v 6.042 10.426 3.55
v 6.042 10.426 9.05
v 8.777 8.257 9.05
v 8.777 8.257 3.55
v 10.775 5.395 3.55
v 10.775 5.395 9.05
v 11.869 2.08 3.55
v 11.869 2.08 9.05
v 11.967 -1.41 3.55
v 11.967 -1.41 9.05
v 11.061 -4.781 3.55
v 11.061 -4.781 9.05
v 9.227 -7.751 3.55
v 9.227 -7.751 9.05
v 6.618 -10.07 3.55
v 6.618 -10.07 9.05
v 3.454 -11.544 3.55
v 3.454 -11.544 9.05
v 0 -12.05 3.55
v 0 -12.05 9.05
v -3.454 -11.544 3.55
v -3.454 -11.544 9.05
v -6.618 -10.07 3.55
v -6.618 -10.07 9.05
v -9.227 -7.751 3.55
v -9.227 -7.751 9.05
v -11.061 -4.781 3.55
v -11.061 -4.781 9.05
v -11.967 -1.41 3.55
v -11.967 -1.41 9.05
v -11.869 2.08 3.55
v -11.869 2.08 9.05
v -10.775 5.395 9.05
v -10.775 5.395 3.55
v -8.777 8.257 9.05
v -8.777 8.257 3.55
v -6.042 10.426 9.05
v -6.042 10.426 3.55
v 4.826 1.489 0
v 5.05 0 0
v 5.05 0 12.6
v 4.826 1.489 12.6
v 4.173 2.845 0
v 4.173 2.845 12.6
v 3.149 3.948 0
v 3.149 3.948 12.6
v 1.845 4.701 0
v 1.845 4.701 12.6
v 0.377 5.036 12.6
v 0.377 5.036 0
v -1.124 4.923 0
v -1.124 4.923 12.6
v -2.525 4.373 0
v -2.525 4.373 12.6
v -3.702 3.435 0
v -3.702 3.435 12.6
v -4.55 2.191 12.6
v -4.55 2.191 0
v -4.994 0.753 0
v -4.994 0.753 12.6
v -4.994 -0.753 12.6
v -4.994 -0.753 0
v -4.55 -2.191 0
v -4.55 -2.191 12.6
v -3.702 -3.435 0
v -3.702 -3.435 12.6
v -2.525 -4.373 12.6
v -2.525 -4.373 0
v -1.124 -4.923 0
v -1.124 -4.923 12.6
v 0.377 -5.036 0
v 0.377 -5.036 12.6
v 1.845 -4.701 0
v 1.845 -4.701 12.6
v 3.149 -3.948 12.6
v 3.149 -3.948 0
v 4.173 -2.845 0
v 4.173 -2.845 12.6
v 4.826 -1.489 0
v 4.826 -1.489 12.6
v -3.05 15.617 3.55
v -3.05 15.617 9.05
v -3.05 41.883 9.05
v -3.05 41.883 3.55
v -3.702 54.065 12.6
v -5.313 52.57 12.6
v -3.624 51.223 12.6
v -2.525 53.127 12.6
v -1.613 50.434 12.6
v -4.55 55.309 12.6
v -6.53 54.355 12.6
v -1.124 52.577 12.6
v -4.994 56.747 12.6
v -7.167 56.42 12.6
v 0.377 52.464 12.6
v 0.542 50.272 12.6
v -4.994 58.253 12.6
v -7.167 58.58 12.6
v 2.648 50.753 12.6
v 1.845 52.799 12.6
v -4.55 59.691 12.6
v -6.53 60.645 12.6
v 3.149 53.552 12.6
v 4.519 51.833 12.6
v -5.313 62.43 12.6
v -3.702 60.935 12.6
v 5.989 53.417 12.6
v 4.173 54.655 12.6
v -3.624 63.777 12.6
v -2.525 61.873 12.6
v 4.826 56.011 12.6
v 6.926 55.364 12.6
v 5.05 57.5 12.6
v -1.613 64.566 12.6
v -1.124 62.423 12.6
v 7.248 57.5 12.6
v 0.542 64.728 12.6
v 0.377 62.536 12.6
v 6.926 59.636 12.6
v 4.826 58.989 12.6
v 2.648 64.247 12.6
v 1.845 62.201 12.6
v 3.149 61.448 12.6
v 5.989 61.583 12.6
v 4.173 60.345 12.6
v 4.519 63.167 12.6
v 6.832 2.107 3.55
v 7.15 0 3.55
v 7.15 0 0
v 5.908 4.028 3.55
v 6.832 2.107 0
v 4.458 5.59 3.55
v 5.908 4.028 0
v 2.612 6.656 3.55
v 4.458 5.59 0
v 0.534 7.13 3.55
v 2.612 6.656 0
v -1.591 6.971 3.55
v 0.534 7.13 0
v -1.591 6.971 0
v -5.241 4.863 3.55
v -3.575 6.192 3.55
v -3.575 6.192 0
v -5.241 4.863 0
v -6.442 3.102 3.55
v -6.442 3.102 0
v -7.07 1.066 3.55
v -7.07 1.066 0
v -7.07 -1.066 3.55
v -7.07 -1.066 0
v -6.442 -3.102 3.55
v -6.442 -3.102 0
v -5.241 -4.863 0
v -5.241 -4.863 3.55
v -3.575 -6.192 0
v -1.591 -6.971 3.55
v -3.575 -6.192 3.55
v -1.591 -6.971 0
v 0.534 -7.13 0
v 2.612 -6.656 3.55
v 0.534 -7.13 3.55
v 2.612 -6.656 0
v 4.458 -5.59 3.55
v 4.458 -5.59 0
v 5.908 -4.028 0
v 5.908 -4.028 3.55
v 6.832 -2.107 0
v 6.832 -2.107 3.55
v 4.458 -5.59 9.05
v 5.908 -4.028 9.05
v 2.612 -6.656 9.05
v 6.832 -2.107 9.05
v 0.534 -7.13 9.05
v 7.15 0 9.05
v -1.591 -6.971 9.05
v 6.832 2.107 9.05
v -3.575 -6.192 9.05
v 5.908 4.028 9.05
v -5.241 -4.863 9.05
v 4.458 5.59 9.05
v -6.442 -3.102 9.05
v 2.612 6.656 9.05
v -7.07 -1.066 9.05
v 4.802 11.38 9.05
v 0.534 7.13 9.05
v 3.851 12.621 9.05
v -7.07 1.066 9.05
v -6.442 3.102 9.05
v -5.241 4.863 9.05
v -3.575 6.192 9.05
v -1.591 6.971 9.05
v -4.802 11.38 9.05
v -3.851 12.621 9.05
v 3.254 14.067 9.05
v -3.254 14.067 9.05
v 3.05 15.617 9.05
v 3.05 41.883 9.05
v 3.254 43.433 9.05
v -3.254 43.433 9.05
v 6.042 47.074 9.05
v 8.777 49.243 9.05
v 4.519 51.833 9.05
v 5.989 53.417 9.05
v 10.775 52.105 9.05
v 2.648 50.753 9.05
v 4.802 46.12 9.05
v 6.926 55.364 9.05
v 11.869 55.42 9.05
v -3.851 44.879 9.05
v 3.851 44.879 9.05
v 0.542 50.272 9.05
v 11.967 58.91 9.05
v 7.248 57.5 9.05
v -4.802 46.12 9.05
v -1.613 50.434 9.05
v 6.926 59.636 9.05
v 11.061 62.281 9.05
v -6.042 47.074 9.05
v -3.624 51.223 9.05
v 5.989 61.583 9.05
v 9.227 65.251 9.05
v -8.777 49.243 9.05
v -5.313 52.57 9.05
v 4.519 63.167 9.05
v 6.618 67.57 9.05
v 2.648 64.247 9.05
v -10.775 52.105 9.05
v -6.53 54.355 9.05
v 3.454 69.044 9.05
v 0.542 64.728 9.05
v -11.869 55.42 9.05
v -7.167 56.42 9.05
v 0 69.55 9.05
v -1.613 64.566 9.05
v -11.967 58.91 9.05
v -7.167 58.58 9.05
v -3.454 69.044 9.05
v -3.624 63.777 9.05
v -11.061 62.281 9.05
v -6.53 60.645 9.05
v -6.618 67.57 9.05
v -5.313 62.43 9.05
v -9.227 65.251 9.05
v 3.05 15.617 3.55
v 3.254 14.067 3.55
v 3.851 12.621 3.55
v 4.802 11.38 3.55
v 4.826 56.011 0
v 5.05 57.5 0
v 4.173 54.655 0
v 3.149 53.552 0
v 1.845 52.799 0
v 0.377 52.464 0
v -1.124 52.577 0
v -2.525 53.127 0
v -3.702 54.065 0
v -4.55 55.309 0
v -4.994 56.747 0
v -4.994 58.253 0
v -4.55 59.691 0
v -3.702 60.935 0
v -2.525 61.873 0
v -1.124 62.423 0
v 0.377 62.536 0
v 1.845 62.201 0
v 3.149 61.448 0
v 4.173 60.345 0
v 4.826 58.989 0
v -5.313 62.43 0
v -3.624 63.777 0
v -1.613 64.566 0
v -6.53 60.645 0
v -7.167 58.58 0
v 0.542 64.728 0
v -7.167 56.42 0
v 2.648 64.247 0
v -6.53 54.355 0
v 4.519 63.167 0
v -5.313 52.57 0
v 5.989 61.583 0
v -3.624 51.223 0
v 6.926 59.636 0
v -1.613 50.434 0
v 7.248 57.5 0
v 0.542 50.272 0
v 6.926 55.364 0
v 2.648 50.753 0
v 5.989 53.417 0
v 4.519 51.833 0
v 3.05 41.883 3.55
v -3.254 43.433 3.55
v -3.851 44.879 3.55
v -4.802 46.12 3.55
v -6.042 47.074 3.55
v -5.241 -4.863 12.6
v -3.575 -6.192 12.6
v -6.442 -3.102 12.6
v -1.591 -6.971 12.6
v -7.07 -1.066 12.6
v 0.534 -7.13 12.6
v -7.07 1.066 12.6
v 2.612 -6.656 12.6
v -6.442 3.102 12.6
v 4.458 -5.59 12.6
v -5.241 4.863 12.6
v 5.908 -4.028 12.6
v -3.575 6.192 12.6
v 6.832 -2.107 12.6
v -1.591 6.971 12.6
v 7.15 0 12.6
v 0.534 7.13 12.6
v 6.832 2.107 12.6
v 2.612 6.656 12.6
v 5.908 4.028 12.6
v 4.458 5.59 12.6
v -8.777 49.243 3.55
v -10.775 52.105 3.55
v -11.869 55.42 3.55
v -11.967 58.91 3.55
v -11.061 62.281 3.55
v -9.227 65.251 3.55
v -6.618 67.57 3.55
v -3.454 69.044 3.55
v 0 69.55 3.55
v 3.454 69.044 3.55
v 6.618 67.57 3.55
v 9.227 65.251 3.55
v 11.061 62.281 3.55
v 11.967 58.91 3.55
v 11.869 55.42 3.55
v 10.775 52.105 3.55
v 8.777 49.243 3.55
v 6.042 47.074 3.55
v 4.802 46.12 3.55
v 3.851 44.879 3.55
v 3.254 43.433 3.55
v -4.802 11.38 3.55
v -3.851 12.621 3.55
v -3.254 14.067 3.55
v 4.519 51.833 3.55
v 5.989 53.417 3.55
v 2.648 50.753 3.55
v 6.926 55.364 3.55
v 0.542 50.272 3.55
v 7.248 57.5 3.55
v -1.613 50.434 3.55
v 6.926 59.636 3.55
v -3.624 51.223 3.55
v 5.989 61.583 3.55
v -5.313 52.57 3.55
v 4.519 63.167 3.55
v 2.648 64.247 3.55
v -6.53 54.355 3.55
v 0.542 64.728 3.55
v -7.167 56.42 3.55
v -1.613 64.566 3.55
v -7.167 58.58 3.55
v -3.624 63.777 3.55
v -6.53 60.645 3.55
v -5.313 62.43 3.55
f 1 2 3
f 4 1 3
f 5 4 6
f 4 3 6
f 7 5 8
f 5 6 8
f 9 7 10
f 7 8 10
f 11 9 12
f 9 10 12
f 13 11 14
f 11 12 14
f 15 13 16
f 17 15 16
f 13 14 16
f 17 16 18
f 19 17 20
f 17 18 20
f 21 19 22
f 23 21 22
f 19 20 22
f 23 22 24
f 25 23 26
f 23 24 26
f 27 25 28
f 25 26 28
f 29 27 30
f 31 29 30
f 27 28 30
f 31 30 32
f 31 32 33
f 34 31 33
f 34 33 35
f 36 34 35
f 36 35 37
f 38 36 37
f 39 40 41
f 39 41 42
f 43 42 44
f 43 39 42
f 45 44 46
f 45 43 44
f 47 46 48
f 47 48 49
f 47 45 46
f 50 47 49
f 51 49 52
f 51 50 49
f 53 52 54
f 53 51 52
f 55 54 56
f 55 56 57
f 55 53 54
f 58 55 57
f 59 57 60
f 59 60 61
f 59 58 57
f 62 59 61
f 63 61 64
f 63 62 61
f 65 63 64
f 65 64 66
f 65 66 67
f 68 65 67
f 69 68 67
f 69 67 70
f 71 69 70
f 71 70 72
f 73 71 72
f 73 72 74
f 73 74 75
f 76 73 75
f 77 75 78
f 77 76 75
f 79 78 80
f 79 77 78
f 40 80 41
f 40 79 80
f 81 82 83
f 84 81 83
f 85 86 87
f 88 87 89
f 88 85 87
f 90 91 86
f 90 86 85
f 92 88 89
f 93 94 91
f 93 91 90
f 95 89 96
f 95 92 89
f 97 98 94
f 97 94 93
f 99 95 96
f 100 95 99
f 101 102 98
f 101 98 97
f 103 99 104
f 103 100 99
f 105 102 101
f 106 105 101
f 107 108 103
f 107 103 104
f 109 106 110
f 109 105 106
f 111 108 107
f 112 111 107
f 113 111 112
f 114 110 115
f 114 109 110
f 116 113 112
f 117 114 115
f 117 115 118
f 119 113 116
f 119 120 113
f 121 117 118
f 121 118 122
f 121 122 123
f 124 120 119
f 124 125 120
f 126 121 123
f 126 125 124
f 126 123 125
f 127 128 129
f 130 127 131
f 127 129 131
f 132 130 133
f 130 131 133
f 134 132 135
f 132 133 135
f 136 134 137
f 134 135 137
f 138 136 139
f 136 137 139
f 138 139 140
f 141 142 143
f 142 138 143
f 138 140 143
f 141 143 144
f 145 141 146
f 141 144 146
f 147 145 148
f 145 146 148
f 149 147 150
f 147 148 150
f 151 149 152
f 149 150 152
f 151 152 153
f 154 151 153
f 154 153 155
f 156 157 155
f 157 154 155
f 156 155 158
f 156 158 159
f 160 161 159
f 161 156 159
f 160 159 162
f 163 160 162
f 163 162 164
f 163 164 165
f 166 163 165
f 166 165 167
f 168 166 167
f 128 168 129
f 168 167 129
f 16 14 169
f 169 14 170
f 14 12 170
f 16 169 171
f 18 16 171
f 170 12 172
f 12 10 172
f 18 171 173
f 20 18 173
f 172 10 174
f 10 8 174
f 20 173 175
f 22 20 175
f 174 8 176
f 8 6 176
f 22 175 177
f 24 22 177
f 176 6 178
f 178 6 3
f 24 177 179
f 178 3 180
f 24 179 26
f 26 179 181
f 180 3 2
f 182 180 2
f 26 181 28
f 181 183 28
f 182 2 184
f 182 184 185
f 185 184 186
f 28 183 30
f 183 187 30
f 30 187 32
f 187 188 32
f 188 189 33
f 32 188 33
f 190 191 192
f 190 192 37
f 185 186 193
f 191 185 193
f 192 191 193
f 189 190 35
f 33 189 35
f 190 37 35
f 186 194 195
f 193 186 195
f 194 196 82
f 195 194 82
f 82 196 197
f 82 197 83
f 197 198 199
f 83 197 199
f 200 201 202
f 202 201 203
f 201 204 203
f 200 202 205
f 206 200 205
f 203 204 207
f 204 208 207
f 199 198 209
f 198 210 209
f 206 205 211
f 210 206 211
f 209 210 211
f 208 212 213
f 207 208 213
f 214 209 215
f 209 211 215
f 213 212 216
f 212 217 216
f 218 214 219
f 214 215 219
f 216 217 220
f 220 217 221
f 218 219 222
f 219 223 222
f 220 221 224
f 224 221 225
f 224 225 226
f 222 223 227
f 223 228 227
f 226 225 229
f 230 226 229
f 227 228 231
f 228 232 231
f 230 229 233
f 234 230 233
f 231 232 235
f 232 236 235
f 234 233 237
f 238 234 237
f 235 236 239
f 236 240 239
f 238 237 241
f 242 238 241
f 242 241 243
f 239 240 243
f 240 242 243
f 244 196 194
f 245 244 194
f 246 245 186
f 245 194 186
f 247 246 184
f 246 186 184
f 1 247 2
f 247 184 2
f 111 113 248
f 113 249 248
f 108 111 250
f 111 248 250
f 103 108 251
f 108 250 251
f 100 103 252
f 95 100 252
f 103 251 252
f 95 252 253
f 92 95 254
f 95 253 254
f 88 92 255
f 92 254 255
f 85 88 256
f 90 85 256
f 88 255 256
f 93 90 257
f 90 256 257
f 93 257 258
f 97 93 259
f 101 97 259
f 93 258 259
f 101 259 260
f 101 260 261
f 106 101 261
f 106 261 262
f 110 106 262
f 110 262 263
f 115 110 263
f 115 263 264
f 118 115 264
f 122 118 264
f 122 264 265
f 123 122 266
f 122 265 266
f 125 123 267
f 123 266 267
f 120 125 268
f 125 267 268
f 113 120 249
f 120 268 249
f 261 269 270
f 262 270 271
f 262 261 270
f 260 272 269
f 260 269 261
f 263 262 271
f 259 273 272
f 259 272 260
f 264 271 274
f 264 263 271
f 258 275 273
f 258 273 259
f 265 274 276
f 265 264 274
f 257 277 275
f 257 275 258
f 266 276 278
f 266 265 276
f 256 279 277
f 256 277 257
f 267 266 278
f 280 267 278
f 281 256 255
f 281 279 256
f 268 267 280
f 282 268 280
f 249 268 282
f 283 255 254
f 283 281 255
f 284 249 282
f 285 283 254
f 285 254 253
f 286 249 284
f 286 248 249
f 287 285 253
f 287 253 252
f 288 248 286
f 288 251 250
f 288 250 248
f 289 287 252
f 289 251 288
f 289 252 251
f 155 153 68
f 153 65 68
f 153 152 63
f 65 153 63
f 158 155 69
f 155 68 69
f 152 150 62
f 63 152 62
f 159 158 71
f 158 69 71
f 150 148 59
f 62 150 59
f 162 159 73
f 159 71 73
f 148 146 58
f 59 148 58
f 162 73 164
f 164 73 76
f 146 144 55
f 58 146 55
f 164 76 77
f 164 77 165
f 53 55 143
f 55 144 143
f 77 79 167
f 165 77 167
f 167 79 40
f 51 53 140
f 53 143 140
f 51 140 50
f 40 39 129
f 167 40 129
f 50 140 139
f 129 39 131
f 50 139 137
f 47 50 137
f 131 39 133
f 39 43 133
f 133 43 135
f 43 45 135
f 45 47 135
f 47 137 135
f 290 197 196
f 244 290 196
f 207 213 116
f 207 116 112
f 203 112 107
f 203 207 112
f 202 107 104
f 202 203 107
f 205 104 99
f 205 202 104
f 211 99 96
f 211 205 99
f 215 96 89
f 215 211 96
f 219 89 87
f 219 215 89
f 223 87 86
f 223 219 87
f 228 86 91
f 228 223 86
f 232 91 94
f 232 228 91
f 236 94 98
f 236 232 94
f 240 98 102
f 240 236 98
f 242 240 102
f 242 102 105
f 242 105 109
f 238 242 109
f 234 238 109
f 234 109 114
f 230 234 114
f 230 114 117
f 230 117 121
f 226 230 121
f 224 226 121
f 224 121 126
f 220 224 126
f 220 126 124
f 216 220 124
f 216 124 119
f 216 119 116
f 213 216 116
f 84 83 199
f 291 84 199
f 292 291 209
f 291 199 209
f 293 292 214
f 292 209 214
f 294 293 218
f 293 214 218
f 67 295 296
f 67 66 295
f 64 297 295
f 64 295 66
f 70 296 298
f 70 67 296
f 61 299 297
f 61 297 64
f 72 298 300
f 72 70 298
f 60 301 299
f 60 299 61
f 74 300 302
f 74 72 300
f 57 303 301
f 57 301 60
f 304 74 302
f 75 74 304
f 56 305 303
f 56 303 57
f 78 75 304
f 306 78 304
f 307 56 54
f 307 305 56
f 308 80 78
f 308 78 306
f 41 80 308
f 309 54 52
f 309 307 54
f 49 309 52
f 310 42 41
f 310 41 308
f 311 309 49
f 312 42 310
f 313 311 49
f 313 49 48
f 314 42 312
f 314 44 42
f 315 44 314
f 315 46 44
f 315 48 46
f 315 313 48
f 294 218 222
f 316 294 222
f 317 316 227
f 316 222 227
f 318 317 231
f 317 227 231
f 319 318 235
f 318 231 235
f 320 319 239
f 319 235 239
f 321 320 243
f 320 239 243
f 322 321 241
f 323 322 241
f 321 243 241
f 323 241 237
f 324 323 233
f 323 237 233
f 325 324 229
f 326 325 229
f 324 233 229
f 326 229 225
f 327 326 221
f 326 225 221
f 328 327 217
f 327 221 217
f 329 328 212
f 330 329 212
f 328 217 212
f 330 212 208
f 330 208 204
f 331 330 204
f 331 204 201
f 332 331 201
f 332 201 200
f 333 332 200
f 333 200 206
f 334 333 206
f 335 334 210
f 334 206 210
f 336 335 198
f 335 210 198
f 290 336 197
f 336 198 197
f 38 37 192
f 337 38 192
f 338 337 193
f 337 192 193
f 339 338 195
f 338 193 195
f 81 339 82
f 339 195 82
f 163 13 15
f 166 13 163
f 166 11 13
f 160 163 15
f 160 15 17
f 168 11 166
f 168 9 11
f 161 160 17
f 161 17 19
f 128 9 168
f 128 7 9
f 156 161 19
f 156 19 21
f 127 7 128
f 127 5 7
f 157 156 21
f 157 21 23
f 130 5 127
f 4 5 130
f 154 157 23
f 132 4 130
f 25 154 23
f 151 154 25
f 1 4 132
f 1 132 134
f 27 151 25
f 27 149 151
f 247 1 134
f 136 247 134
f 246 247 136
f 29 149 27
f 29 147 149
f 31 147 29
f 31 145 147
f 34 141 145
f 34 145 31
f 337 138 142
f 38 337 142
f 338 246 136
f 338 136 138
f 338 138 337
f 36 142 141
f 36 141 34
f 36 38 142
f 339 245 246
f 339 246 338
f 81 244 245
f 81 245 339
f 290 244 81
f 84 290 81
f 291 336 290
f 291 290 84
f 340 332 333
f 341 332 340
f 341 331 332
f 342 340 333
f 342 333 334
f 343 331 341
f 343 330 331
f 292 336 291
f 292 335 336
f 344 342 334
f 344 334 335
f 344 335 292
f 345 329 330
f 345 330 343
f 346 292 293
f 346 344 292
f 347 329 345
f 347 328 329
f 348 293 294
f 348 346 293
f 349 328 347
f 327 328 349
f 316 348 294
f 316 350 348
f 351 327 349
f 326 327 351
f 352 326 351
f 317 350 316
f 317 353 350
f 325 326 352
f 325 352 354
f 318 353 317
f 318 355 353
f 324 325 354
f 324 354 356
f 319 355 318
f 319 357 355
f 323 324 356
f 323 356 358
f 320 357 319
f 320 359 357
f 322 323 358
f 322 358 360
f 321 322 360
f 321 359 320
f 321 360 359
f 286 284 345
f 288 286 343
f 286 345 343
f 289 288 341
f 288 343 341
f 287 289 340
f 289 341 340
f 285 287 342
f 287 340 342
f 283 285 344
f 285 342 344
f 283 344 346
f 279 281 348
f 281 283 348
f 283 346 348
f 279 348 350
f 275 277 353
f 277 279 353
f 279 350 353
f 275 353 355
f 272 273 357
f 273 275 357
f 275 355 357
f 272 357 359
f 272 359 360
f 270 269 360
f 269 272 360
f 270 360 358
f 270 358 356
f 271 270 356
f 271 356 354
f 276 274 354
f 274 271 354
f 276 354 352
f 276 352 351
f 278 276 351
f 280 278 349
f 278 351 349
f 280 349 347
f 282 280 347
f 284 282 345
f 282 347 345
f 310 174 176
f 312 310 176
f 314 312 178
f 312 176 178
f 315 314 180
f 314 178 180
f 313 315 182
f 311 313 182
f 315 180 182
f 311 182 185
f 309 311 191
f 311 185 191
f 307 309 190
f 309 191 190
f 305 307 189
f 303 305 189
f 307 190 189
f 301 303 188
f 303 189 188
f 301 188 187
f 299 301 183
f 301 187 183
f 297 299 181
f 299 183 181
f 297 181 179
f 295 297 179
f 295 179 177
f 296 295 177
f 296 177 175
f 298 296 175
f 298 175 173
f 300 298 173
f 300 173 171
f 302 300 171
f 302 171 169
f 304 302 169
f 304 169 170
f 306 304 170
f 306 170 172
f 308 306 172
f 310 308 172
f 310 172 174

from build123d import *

# Parameters (mm, degrees)
SKETCH1_R                       = 7.15
SKETCH1_R_2                     = 5.05
BOSS_EXTRUDE1_DEPTH             = 12.6
BOSS_EXTRUDE2_DEPTH             = 2.75
BOSS_EXTRUDE2_DEPTH_BACK        = 2.75
SKETCH2_R                       = 7.2
SKETCH2_R_2                     = 7.15
BOSS_EXTRUDE3_REACH             = 73.164
SKETCH3_R                       = 7.248211447
SKETCH3_R_2                     = 5.05
BOSS_EXTRUDE3_DIRECTION_2_REACH = 73.164


with BuildPart() as part:
    # Sketch1 → Boss-Extrude1 (new body)
    with BuildSketch(Plane.XY):
        Circle(SKETCH1_R)
        Circle(SKETCH1_R_2, mode=Mode.SUBTRACT)
    extrude(amount=BOSS_EXTRUDE1_DEPTH)

    # Sketch2 → Boss-Extrude2 (add, two sides: drawn at the far end of the back side and taken through both)
    with BuildSketch(Plane(origin=(0, 0, 6.3), x_dir=(-1, 0, 0), z_dir=(0, 0, -1)).offset(-BOSS_EXTRUDE2_DEPTH_BACK)):
        with BuildLine():
            Line((3.05, 15.617298102), (3.05, 41.882701898))
            ThreePointArc((3.05, 41.882701898), (3.851449168, 44.878543892), (6.041689751, 47.074047528))
            ThreePointArc((6.041689751, 47.074047528), (0, 69.55), (-6.041689751, 47.074047528))
            ThreePointArc((-6.041689751, 47.074047528), (-3.851449168, 44.878543892), (-3.05, 41.882701898))
            Line((-3.05, 41.882701898), (-3.05, 15.617298102))
            ThreePointArc((-3.05, 15.617298102), (-3.851449168, 12.621456108), (-6.041689751, 10.425952472))
            ThreePointArc((-6.041689751, 10.425952472), (0, -12.05), (6.041689751, 10.425952472))
            ThreePointArc((6.041689751, 10.425952472), (3.851449168, 12.621456108), (3.05, 15.617298102))
        make_face()
        with Locations((0, 57.5)):
            Circle(SKETCH2_R, mode=Mode.SUBTRACT)
        with Locations(Location((0, 0, 0), (0, 0, 180))):
            Circle(SKETCH2_R_2, mode=Mode.SUBTRACT)
    extrude(amount=BOSS_EXTRUDE2_DEPTH + BOSS_EXTRUDE2_DEPTH_BACK)

    # Boss-Extrude3: up to this face of the body (flat: up to its plane)
    boss_extrude3_end = Plane(part.part.faces().sort_by_distance((-6.947767461, 0, 0))[0])
    # Sketch3 → Boss-Extrude3 (add, up to the picked face)
    with BuildSketch(Plane(origin=(0, 0, 3.55), x_dir=(-1, 0, 0), z_dir=(0, 0, -1)), mode=Mode.PRIVATE) as boss_extrude3_sk1:
        with Locations(Location((0, 57.5, 0), (0, 0, 180))):
            Circle(SKETCH3_R)
        with Locations(Location((0, 57.5, 0), (0, 0, 180))):
            Circle(SKETCH3_R_2, mode=Mode.SUBTRACT)
    boss_extrude3_tool1 = split(extrude(boss_extrude3_sk1.sketch, amount=BOSS_EXTRUDE3_REACH, mode=Mode.PRIVATE), bisect_by=boss_extrude3_end, keep=Keep.BOTH, mode=Mode.PRIVATE)
    add(boss_extrude3_tool1.solids().sort_by(Axis((-7.043201, 57.5, 3.55), (0, 0, -1)))[0])

    # Boss-Extrude3 direction 2: up to this face of the body (flat: up to its plane)
    boss_extrude3_direction_2_end = Plane(part.part.faces().sort_by_distance((-6.947767461, 0, 12.6))[0])
    # Sketch3 → Boss-Extrude3 direction 2 (add, up to the picked face)
    with BuildSketch(Plane(origin=(0, 0, 3.55), x_dir=(-1, 0, 0), z_dir=(0, 0, -1)), mode=Mode.PRIVATE) as boss_extrude3_direction_2_sk1:
        with Locations(Location((0, 57.5, 0), (0, 0, 180))):
            Circle(SKETCH3_R)
        with Locations(Location((0, 57.5, 0), (0, 0, 180))):
            Circle(SKETCH3_R_2, mode=Mode.SUBTRACT)
    boss_extrude3_direction_2_tool1 = split(extrude(boss_extrude3_direction_2_sk1.sketch, amount=-BOSS_EXTRUDE3_DIRECTION_2_REACH, mode=Mode.PRIVATE), bisect_by=boss_extrude3_direction_2_end, keep=Keep.BOTH, mode=Mode.PRIVATE)
    add(boss_extrude3_direction_2_tool1.solids().sort_by(Axis((-7.043201, 57.5, 3.55), (0, 0, 1)))[0])


solid = part.part
